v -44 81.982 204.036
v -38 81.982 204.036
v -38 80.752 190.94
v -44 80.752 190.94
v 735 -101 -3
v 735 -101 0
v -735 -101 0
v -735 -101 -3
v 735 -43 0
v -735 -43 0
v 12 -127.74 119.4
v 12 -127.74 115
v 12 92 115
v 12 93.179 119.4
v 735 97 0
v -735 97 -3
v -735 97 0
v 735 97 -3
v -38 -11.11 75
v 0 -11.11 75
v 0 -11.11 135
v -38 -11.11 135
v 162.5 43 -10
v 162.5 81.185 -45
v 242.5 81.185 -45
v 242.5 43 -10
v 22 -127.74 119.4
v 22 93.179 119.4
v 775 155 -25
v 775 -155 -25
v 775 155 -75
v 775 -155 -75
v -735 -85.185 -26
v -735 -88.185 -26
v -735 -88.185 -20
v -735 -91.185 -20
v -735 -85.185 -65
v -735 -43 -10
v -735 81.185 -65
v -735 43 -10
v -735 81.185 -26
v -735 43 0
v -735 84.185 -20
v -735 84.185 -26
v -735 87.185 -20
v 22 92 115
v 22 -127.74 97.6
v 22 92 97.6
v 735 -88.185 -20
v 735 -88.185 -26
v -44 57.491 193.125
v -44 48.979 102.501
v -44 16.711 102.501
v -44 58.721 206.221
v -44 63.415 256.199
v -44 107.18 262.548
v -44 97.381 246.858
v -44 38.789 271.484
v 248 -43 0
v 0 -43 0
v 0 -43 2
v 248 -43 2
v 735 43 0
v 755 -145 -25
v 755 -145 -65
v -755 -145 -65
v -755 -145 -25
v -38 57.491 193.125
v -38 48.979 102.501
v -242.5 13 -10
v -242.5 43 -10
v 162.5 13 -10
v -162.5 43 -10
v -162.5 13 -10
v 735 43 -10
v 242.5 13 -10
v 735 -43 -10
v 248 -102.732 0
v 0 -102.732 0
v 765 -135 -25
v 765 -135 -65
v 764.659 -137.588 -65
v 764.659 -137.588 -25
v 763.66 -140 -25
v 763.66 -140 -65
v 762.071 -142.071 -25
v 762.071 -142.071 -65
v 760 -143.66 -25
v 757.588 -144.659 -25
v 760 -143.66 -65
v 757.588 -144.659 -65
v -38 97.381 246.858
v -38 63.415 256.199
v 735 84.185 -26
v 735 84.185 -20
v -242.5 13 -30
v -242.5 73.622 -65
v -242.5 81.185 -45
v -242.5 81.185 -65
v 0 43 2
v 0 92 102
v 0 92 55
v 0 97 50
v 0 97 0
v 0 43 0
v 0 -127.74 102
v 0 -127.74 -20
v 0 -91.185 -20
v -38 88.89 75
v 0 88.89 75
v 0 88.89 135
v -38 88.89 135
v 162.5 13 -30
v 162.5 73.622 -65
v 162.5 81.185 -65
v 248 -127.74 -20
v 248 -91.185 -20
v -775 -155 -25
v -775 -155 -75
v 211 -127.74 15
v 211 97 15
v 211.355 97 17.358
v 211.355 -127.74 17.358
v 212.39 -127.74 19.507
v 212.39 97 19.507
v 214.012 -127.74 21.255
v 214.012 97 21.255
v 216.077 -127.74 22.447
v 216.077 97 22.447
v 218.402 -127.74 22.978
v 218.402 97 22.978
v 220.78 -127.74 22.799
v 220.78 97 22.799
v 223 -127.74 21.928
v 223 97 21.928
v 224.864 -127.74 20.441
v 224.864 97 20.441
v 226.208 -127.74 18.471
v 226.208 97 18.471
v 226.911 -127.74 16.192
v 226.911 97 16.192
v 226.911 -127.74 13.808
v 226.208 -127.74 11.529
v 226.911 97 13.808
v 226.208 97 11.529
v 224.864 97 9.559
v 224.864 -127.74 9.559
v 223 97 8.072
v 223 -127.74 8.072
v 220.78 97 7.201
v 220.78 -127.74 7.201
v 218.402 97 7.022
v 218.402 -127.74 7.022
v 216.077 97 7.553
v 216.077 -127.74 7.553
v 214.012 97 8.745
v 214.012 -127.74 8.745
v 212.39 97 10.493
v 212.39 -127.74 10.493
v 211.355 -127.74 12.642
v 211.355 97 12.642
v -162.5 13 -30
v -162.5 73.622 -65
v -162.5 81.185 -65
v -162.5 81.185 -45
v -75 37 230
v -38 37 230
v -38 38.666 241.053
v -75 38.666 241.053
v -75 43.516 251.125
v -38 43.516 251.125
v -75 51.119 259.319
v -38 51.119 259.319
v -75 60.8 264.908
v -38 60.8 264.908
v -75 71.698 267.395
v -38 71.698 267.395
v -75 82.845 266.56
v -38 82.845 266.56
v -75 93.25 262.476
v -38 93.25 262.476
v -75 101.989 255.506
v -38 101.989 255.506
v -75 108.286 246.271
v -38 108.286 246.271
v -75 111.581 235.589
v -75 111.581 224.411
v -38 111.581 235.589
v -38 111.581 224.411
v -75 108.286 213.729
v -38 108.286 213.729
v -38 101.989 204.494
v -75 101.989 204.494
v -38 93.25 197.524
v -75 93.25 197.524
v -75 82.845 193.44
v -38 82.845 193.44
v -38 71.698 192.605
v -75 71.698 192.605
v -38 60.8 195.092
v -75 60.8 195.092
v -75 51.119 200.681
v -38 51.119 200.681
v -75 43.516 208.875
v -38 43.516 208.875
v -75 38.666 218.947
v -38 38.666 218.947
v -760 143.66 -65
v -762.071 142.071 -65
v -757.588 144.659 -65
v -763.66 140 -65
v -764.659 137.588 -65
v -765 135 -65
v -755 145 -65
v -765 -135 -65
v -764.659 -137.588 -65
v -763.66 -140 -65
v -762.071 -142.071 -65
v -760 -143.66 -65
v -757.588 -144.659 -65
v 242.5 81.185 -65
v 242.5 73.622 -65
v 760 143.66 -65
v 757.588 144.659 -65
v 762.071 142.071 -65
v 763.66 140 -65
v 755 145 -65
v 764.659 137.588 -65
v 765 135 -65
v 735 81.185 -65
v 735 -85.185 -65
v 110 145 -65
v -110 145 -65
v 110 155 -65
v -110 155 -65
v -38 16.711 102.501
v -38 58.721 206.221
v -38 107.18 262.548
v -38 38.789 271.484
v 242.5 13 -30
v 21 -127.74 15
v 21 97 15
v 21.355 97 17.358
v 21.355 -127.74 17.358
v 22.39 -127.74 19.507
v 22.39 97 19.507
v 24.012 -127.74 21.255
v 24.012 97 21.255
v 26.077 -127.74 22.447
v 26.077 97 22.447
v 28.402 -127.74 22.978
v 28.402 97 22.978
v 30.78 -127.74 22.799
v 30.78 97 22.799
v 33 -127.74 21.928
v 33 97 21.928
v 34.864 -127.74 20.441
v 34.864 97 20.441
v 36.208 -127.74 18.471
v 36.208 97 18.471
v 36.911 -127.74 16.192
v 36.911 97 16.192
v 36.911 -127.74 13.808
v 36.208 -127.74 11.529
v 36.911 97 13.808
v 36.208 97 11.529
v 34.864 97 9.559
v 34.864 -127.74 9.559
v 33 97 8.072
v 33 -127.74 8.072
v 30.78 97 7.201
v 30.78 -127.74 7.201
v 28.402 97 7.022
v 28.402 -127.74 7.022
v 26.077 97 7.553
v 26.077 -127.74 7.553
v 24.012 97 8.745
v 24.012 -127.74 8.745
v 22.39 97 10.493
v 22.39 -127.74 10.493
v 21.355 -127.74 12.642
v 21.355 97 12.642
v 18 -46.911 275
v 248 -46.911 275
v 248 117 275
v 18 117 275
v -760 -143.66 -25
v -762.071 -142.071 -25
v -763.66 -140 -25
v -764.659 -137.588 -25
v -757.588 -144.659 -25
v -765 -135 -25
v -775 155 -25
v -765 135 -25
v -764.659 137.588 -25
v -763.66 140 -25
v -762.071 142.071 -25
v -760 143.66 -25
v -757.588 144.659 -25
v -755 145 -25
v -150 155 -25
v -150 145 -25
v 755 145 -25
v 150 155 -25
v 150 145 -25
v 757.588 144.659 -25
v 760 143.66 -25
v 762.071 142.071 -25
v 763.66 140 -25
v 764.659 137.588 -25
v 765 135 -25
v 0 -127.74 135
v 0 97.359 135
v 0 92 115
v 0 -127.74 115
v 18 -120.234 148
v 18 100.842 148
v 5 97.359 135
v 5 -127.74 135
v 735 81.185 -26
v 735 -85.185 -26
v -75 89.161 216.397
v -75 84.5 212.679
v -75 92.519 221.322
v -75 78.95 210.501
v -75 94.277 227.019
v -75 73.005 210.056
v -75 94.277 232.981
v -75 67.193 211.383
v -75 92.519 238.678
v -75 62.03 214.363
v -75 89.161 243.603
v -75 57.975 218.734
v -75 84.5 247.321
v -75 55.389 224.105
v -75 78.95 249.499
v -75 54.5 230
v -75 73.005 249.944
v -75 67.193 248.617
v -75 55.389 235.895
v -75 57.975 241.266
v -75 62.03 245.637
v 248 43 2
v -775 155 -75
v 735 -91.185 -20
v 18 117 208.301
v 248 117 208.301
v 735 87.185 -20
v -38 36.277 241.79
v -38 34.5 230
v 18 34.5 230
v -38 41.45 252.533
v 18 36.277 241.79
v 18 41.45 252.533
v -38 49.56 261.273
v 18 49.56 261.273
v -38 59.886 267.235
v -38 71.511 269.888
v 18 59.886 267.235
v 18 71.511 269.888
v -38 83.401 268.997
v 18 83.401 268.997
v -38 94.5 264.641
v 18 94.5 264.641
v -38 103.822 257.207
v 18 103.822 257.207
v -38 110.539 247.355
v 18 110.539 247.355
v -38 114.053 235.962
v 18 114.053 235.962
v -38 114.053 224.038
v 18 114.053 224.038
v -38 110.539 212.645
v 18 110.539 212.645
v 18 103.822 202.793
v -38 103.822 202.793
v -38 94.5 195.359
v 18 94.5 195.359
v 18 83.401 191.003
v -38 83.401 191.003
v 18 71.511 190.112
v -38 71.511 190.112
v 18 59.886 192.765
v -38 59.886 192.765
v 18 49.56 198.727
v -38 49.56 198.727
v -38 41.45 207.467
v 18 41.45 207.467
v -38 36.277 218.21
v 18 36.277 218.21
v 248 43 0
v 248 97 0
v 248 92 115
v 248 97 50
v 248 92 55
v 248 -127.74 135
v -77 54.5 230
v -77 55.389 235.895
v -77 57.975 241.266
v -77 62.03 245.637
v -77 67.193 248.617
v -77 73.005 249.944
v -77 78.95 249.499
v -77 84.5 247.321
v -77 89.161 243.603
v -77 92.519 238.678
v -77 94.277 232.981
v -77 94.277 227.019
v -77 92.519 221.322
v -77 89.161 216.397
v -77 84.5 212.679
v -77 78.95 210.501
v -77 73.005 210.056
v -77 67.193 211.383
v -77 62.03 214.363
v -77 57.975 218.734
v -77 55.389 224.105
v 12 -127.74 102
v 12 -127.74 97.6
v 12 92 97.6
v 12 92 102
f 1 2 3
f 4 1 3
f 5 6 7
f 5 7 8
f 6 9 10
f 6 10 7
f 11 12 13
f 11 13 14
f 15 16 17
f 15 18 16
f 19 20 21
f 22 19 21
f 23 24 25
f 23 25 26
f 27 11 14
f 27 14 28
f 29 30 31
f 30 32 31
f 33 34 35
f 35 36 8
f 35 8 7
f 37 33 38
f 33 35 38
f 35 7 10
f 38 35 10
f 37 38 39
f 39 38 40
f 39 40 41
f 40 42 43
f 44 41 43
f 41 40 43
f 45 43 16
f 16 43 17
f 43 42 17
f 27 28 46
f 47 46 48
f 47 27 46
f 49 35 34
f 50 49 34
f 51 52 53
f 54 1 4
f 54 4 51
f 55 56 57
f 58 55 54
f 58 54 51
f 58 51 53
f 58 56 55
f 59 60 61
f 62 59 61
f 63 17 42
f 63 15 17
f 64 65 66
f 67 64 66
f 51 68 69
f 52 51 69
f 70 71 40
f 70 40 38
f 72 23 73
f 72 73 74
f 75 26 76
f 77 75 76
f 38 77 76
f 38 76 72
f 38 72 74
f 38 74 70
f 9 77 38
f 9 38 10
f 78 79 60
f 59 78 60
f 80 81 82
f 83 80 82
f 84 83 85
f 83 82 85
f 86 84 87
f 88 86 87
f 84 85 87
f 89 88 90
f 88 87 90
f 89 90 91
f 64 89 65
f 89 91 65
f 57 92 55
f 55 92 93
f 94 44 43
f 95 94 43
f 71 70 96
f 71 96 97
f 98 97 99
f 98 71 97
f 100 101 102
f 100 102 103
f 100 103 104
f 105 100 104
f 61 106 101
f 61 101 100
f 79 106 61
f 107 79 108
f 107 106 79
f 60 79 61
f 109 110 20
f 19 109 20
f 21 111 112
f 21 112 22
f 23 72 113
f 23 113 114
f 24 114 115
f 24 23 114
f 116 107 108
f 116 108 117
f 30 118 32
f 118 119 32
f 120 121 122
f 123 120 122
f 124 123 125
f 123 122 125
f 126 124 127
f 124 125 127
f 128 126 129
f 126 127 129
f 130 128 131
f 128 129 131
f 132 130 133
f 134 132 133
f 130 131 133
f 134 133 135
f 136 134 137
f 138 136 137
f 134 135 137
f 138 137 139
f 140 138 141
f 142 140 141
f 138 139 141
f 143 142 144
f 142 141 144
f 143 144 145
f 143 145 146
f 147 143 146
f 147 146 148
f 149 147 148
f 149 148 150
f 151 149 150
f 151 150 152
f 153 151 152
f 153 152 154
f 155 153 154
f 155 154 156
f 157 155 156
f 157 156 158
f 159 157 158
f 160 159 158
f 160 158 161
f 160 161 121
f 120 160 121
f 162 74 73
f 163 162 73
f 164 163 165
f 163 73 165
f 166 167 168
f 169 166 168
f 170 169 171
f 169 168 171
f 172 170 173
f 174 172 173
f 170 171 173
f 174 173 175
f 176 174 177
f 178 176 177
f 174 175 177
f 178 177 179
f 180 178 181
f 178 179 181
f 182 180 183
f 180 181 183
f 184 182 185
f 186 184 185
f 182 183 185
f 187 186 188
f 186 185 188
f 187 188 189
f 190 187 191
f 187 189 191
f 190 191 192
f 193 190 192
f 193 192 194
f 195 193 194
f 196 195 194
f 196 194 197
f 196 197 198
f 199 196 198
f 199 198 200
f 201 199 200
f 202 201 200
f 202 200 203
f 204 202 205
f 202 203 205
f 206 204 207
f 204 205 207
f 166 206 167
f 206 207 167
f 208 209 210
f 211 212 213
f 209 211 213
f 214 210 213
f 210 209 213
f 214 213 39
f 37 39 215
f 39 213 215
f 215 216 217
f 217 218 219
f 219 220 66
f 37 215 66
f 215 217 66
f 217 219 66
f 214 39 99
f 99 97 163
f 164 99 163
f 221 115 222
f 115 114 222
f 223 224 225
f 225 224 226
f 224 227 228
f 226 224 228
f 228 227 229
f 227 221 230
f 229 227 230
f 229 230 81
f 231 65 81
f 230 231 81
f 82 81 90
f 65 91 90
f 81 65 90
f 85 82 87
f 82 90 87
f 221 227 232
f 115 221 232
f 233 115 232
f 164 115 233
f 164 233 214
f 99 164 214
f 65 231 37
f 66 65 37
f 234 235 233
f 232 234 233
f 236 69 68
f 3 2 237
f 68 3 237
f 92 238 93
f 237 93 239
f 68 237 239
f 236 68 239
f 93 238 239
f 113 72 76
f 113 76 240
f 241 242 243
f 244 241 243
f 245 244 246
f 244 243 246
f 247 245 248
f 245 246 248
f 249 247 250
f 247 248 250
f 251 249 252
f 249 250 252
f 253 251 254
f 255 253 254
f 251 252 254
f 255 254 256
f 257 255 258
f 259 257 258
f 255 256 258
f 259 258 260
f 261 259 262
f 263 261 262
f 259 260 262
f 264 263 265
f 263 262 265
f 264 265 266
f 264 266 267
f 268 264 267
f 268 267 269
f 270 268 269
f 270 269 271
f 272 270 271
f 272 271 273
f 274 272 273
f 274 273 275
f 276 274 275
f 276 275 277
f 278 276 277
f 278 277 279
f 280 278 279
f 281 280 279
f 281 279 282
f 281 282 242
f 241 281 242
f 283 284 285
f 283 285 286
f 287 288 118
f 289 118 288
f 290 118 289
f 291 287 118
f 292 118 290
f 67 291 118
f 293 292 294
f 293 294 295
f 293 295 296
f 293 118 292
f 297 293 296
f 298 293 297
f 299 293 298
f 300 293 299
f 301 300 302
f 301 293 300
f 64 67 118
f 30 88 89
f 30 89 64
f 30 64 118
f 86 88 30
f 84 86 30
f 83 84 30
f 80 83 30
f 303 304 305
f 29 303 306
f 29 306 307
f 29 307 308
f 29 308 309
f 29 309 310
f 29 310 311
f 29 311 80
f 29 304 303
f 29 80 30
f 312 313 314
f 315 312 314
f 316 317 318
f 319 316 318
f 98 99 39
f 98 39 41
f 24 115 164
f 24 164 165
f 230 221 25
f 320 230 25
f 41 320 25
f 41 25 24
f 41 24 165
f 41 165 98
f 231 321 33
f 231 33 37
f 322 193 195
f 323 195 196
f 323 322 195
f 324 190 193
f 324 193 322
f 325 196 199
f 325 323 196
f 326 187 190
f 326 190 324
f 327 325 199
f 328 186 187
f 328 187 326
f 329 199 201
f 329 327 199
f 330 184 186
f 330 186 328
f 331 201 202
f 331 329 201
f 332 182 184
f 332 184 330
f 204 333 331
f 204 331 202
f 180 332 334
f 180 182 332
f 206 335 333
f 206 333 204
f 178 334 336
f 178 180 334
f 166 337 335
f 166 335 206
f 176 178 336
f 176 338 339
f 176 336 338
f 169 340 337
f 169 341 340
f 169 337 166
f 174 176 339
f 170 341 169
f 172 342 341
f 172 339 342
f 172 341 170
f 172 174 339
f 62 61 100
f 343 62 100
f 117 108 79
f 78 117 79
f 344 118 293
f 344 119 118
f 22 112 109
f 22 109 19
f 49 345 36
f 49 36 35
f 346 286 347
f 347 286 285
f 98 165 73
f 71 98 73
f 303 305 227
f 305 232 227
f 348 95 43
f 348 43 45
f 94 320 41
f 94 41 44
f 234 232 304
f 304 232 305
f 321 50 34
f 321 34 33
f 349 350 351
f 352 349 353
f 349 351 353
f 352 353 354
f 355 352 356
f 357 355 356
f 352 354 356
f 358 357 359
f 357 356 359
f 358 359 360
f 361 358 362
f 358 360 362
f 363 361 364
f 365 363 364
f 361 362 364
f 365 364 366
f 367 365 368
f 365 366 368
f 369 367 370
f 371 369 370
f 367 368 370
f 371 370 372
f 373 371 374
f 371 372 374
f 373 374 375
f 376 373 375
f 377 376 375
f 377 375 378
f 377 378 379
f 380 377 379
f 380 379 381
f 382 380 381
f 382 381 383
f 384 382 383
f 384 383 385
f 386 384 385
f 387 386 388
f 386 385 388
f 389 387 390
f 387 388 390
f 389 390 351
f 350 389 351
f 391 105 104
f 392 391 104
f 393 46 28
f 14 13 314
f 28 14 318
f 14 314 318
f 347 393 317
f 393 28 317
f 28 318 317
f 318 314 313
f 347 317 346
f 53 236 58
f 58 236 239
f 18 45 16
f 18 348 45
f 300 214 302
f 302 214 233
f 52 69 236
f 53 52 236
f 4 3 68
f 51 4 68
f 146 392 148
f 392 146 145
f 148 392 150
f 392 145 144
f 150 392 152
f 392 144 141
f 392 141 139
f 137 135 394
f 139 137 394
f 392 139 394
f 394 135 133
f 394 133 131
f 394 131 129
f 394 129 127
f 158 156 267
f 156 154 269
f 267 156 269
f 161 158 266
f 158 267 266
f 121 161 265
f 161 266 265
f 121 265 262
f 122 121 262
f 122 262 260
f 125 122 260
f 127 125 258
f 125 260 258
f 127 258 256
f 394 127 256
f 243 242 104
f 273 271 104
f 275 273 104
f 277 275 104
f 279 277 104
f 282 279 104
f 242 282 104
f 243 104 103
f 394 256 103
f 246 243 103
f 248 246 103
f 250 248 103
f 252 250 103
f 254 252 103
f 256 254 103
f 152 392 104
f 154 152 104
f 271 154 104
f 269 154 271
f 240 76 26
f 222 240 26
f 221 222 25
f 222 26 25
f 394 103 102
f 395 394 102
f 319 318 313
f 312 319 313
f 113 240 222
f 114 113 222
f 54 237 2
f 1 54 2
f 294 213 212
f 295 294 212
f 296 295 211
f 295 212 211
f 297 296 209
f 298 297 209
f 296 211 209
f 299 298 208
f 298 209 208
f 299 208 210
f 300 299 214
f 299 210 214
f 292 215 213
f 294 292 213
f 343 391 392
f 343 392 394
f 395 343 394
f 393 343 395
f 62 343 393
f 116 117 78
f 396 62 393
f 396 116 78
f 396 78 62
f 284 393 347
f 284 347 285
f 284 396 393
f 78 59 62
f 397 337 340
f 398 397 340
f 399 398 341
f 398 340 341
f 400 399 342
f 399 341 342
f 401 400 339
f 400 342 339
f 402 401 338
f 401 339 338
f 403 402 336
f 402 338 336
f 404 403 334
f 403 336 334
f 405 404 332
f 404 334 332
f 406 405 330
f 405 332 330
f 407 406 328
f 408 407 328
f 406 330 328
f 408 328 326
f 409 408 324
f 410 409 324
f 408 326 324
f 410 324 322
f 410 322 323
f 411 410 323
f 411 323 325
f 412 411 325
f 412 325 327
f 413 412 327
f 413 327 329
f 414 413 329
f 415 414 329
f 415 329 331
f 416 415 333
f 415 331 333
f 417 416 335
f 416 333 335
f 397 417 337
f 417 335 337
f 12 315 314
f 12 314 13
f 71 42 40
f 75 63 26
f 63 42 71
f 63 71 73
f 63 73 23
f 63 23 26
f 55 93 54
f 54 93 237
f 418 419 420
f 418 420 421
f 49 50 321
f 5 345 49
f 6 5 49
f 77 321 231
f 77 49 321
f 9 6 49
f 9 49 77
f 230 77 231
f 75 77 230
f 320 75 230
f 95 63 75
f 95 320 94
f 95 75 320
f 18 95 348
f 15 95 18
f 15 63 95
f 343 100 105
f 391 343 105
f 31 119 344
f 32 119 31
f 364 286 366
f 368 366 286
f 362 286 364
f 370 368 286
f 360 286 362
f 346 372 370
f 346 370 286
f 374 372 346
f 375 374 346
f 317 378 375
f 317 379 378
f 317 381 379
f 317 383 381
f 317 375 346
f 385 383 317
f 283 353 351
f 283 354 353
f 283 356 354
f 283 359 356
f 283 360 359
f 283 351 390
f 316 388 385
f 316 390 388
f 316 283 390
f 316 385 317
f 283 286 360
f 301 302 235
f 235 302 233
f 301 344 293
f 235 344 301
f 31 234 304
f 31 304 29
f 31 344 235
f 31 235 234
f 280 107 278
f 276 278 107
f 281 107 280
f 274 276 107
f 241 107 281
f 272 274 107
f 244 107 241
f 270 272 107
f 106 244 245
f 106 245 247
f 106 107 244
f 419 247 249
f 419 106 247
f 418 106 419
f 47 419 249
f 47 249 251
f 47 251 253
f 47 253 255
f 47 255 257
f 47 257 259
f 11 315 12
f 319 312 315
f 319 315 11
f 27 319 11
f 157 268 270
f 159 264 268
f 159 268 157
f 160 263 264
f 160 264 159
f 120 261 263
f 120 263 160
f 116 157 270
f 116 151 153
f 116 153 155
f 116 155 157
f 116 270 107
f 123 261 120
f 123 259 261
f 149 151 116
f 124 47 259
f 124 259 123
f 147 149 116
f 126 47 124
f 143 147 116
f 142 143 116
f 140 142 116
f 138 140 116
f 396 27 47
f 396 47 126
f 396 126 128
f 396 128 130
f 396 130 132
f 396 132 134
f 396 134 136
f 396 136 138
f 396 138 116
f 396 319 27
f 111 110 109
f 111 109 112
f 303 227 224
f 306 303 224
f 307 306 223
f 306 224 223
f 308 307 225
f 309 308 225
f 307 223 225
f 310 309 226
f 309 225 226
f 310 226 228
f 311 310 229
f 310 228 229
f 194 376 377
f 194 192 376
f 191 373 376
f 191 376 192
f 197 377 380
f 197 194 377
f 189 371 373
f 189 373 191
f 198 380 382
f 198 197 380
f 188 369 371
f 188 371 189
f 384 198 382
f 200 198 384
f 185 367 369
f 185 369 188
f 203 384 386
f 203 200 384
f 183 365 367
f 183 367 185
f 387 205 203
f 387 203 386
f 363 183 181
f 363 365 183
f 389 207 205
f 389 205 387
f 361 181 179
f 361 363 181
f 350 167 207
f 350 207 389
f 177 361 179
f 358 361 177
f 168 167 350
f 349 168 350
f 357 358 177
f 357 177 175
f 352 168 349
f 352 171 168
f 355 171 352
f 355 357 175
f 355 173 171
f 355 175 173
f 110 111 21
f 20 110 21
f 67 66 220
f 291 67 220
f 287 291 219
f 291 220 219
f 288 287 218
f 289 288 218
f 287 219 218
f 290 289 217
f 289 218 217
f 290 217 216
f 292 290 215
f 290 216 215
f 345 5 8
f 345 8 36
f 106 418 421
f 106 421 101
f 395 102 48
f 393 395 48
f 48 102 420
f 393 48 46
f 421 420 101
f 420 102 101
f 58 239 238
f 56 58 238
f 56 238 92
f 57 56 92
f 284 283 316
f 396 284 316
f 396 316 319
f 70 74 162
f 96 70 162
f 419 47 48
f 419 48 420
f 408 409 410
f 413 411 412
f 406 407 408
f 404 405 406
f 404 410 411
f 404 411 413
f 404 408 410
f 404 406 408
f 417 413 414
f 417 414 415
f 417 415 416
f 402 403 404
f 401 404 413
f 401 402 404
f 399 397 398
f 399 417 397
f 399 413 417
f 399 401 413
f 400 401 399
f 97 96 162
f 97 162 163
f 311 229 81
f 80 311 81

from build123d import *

# Parameters (mm, degrees)
F1_DEPTH       = 735
F2_W           = 1550
F2_H           = 310
F3_DEPTH       = 10
F4_W           = 1550
F4_H           = 310
F5_DEPTH       = 40
F7_DEPTH       = 10.0000041723
F10_DEPTH      = 80
F14_DEPTH      = 127.74
F14_DEPTH_BACK = 117
F16_DEPTH      = 248
F18_D          = 16
F19_R          = 40
F20_DEPTH      = 56
F21_R          = 37.5
F22_DEPTH      = 37
F23_R          = 20
F24_DEPTH      = 2
F25_W          = 100
F25_H          = 60
F26_DEPTH      = 38
F28_DEPTH      = 6


with BuildPart() as f1:
    # F0 (on Right) → F1 (new body, symmetric)
    with BuildSketch(Plane.YZ):
        Polygon((97, 0), (43, 0), (43, -10), (-43, -10), (-43, 0), (-101, 0), (-101, -3), (-91.1850454238, -20), (-88.1850454238, -20), (-88.1850454238, -26), (-85.1850454238, -26), (-85.1850454238, -65), (81.1850454238, -65), (81.1850454238, -26), (84.1850454238, -26), (84.1850454238, -20), (87.1850454238, -20), (97, -3), align=None)
    extrude(amount=F1_DEPTH, both=True)

    # F2 (on face) → F3 (join)
    with BuildSketch(Plane(origin=(0, 0, -65), x_dir=(1, 0, 0), z_dir=(0, 0, -1))):
        Rectangle(F2_W, F2_H)
    extrude(amount=F3_DEPTH)

    # F4 (on face) → F5 (join)
    with BuildSketch(Plane.XY.offset(-65)):
        Rectangle(F4_W, F4_H)
        with BuildLine():
            ThreePointArc((-764.9999958277, 134.9999958277), (-762.0710636395, 142.0710636395), (-754.9999958277, 144.9999958277))
            Line((-754.9999958277, 144.9999958277), (754.9999958277, 144.9999958277))
            ThreePointArc((754.9999958277, 144.9999958277), (762.0710636395, 142.0710636395), (764.9999958277, 134.9999958277))
            Line((764.9999958277, 134.9999958277), (764.9999958277, -134.9999958277))
            ThreePointArc((764.9999958277, -134.9999958277), (762.0710636395, -142.0710636395), (754.9999958277, -144.9999958277))
            Line((754.9999958277, -144.9999958277), (-754.9999958277, -144.9999958277))
            ThreePointArc((-754.9999958277, -144.9999958277), (-762.0710636395, -142.0710636395), (-764.9999958277, -134.9999958277))
            Line((-764.9999958277, -134.9999958277), (-764.9999958277, 134.9999958277))
        make_face(mode=Mode.SUBTRACT)
    extrude(amount=F5_DEPTH)

    # F6 (on face) → F7 (cut, through all)
    with BuildSketch(Plane.XZ.offset(-144.9999958277)):
        Polygon((110, -65), (150, -25), (-150, -25), (-110, -65), align=None)
    extrude(amount=-F7_DEPTH, mode=Mode.SUBTRACT)


with BuildPart() as f10:
    # F9 (on offset) → F10 (new body)
    with BuildSketch(Plane.YZ.offset(162.5)):
        Polygon((43, -10), (13, -10), (13, -30), (73.6217782649, -65), (81.1850454238, -65), (81.1850454238, -45), align=None)
    extrude(amount=F10_DEPTH)


with BuildPart() as f11_1:
    # F11: instance of F10
    add(f10.part.mirror(Plane.YZ))


with BuildPart() as f1_1:
    add(f1.part)

    # F12: cut F10, F11_1
    add(f10.part, mode=Mode.SUBTRACT)
    add(f11_1.part, mode=Mode.SUBTRACT)


with BuildPart() as f14:
    # F13 (on Front) → F14 (new body, two sides)
    with BuildSketch(Plane.XZ) as f14_sk:
        Polygon((0, 102), (0, -20), (248, -20), (248, 275), (18, 275), (18, 148), (5, 135), (0, 135), (0, 115), (12, 115), (12, 119.4), (22, 119.4), (22, 97.6), (12, 97.6), (12, 102), align=None)
    extrude(amount=F14_DEPTH)
    extrude(f14_sk.sketch, amount=-F14_DEPTH_BACK)

    # F15 (on face) → F16 (cut, through all)
    with BuildSketch(Plane(origin=(0, 0, 0), x_dir=(0, -1, 0), z_dir=(-1, 0, 0))):
        Polygon((127.74, 275), (46.9109623135, 275), (127.74, 135), align=None)
        Polygon((-117, 208.3012701892), (-117, 102), (-92, 102), (-92, 115), align=None)
        Polygon((-117, -20), (91.1850454238, -20), (102.7320508076, 0), (43, 0), (43, 2), (-43, 2), (-43, 0), (-97, 0), (-97, 50), (-92, 55), (-92, 102), (-117, 102), align=None)
    extrude(amount=-F16_DEPTH, mode=Mode.SUBTRACT)

    # F18 (through all)
    with Locations(Plane.XZ.offset(127.74)):
        with Locations((29, 15), (219, 15)):
            Hole(F18_D / 2)

    # F19 (on face) → F20 (join)
    with BuildSketch(Plane(origin=(18, 0, 0), x_dir=(0, -1, 0), z_dir=(-1, 0, 0))):
        with Locations((-74.5, 230)):
            Circle(F19_R)
    extrude(amount=F20_DEPTH)

    # F21 (on face) → F22 (join)
    with BuildSketch(Plane(origin=(-38, 0, 0), x_dir=(0, -1, 0), z_dir=(-1, 0, 0))):
        with Locations((-74.5, 230)):
            Circle(F21_R)
    extrude(amount=F22_DEPTH)

    # F23 (on face) → F24 (join)
    with BuildSketch(Plane(origin=(-75, 0, 0), x_dir=(0, -1, 0), z_dir=(-1, 0, 0))):
        with Locations((-74.5, 230)):
            Circle(F23_R)
    extrude(amount=F24_DEPTH)


with BuildPart() as f26:
    # F25 (on face) → F26 (new body)
    with BuildSketch(Plane(origin=(0, 0, 0), x_dir=(0, -1, 0), z_dir=(-1, 0, 0))):
        with Locations((-38.8895094395, 105)):
            Rectangle(F25_W, F25_H)
    extrude(amount=F26_DEPTH)


with BuildPart() as f28:
    # F27 (on face) → F28 (new body)
    with BuildSketch(Plane(origin=(-38, 0, 0), x_dir=(0, -1, 0), z_dir=(-1, 0, 0))):
        Polygon((-107.1801793967, 262.5484420728), (-97.3811000586, 246.8583136797), (-63.4147301316, 256.1990916729), (-58.7206114187, 206.2205382433), (-57.4906279968, 193.1248336123), (-48.9790178835, 102.5012284517), (-16.7109631002, 102.5012284517), (-38.7891046703, 271.4839577675), align=None)
        Polygon((-57.4906279968, 193.1248336123), (-58.7206114187, 206.2205382433), (-81.9822331447, 204.03574484), (-80.7522497228, 190.940040209), align=None)
    extrude(amount=F28_DEPTH)


solid = Compound([f1_1.part, f14.part, f26.part, f28.part])
